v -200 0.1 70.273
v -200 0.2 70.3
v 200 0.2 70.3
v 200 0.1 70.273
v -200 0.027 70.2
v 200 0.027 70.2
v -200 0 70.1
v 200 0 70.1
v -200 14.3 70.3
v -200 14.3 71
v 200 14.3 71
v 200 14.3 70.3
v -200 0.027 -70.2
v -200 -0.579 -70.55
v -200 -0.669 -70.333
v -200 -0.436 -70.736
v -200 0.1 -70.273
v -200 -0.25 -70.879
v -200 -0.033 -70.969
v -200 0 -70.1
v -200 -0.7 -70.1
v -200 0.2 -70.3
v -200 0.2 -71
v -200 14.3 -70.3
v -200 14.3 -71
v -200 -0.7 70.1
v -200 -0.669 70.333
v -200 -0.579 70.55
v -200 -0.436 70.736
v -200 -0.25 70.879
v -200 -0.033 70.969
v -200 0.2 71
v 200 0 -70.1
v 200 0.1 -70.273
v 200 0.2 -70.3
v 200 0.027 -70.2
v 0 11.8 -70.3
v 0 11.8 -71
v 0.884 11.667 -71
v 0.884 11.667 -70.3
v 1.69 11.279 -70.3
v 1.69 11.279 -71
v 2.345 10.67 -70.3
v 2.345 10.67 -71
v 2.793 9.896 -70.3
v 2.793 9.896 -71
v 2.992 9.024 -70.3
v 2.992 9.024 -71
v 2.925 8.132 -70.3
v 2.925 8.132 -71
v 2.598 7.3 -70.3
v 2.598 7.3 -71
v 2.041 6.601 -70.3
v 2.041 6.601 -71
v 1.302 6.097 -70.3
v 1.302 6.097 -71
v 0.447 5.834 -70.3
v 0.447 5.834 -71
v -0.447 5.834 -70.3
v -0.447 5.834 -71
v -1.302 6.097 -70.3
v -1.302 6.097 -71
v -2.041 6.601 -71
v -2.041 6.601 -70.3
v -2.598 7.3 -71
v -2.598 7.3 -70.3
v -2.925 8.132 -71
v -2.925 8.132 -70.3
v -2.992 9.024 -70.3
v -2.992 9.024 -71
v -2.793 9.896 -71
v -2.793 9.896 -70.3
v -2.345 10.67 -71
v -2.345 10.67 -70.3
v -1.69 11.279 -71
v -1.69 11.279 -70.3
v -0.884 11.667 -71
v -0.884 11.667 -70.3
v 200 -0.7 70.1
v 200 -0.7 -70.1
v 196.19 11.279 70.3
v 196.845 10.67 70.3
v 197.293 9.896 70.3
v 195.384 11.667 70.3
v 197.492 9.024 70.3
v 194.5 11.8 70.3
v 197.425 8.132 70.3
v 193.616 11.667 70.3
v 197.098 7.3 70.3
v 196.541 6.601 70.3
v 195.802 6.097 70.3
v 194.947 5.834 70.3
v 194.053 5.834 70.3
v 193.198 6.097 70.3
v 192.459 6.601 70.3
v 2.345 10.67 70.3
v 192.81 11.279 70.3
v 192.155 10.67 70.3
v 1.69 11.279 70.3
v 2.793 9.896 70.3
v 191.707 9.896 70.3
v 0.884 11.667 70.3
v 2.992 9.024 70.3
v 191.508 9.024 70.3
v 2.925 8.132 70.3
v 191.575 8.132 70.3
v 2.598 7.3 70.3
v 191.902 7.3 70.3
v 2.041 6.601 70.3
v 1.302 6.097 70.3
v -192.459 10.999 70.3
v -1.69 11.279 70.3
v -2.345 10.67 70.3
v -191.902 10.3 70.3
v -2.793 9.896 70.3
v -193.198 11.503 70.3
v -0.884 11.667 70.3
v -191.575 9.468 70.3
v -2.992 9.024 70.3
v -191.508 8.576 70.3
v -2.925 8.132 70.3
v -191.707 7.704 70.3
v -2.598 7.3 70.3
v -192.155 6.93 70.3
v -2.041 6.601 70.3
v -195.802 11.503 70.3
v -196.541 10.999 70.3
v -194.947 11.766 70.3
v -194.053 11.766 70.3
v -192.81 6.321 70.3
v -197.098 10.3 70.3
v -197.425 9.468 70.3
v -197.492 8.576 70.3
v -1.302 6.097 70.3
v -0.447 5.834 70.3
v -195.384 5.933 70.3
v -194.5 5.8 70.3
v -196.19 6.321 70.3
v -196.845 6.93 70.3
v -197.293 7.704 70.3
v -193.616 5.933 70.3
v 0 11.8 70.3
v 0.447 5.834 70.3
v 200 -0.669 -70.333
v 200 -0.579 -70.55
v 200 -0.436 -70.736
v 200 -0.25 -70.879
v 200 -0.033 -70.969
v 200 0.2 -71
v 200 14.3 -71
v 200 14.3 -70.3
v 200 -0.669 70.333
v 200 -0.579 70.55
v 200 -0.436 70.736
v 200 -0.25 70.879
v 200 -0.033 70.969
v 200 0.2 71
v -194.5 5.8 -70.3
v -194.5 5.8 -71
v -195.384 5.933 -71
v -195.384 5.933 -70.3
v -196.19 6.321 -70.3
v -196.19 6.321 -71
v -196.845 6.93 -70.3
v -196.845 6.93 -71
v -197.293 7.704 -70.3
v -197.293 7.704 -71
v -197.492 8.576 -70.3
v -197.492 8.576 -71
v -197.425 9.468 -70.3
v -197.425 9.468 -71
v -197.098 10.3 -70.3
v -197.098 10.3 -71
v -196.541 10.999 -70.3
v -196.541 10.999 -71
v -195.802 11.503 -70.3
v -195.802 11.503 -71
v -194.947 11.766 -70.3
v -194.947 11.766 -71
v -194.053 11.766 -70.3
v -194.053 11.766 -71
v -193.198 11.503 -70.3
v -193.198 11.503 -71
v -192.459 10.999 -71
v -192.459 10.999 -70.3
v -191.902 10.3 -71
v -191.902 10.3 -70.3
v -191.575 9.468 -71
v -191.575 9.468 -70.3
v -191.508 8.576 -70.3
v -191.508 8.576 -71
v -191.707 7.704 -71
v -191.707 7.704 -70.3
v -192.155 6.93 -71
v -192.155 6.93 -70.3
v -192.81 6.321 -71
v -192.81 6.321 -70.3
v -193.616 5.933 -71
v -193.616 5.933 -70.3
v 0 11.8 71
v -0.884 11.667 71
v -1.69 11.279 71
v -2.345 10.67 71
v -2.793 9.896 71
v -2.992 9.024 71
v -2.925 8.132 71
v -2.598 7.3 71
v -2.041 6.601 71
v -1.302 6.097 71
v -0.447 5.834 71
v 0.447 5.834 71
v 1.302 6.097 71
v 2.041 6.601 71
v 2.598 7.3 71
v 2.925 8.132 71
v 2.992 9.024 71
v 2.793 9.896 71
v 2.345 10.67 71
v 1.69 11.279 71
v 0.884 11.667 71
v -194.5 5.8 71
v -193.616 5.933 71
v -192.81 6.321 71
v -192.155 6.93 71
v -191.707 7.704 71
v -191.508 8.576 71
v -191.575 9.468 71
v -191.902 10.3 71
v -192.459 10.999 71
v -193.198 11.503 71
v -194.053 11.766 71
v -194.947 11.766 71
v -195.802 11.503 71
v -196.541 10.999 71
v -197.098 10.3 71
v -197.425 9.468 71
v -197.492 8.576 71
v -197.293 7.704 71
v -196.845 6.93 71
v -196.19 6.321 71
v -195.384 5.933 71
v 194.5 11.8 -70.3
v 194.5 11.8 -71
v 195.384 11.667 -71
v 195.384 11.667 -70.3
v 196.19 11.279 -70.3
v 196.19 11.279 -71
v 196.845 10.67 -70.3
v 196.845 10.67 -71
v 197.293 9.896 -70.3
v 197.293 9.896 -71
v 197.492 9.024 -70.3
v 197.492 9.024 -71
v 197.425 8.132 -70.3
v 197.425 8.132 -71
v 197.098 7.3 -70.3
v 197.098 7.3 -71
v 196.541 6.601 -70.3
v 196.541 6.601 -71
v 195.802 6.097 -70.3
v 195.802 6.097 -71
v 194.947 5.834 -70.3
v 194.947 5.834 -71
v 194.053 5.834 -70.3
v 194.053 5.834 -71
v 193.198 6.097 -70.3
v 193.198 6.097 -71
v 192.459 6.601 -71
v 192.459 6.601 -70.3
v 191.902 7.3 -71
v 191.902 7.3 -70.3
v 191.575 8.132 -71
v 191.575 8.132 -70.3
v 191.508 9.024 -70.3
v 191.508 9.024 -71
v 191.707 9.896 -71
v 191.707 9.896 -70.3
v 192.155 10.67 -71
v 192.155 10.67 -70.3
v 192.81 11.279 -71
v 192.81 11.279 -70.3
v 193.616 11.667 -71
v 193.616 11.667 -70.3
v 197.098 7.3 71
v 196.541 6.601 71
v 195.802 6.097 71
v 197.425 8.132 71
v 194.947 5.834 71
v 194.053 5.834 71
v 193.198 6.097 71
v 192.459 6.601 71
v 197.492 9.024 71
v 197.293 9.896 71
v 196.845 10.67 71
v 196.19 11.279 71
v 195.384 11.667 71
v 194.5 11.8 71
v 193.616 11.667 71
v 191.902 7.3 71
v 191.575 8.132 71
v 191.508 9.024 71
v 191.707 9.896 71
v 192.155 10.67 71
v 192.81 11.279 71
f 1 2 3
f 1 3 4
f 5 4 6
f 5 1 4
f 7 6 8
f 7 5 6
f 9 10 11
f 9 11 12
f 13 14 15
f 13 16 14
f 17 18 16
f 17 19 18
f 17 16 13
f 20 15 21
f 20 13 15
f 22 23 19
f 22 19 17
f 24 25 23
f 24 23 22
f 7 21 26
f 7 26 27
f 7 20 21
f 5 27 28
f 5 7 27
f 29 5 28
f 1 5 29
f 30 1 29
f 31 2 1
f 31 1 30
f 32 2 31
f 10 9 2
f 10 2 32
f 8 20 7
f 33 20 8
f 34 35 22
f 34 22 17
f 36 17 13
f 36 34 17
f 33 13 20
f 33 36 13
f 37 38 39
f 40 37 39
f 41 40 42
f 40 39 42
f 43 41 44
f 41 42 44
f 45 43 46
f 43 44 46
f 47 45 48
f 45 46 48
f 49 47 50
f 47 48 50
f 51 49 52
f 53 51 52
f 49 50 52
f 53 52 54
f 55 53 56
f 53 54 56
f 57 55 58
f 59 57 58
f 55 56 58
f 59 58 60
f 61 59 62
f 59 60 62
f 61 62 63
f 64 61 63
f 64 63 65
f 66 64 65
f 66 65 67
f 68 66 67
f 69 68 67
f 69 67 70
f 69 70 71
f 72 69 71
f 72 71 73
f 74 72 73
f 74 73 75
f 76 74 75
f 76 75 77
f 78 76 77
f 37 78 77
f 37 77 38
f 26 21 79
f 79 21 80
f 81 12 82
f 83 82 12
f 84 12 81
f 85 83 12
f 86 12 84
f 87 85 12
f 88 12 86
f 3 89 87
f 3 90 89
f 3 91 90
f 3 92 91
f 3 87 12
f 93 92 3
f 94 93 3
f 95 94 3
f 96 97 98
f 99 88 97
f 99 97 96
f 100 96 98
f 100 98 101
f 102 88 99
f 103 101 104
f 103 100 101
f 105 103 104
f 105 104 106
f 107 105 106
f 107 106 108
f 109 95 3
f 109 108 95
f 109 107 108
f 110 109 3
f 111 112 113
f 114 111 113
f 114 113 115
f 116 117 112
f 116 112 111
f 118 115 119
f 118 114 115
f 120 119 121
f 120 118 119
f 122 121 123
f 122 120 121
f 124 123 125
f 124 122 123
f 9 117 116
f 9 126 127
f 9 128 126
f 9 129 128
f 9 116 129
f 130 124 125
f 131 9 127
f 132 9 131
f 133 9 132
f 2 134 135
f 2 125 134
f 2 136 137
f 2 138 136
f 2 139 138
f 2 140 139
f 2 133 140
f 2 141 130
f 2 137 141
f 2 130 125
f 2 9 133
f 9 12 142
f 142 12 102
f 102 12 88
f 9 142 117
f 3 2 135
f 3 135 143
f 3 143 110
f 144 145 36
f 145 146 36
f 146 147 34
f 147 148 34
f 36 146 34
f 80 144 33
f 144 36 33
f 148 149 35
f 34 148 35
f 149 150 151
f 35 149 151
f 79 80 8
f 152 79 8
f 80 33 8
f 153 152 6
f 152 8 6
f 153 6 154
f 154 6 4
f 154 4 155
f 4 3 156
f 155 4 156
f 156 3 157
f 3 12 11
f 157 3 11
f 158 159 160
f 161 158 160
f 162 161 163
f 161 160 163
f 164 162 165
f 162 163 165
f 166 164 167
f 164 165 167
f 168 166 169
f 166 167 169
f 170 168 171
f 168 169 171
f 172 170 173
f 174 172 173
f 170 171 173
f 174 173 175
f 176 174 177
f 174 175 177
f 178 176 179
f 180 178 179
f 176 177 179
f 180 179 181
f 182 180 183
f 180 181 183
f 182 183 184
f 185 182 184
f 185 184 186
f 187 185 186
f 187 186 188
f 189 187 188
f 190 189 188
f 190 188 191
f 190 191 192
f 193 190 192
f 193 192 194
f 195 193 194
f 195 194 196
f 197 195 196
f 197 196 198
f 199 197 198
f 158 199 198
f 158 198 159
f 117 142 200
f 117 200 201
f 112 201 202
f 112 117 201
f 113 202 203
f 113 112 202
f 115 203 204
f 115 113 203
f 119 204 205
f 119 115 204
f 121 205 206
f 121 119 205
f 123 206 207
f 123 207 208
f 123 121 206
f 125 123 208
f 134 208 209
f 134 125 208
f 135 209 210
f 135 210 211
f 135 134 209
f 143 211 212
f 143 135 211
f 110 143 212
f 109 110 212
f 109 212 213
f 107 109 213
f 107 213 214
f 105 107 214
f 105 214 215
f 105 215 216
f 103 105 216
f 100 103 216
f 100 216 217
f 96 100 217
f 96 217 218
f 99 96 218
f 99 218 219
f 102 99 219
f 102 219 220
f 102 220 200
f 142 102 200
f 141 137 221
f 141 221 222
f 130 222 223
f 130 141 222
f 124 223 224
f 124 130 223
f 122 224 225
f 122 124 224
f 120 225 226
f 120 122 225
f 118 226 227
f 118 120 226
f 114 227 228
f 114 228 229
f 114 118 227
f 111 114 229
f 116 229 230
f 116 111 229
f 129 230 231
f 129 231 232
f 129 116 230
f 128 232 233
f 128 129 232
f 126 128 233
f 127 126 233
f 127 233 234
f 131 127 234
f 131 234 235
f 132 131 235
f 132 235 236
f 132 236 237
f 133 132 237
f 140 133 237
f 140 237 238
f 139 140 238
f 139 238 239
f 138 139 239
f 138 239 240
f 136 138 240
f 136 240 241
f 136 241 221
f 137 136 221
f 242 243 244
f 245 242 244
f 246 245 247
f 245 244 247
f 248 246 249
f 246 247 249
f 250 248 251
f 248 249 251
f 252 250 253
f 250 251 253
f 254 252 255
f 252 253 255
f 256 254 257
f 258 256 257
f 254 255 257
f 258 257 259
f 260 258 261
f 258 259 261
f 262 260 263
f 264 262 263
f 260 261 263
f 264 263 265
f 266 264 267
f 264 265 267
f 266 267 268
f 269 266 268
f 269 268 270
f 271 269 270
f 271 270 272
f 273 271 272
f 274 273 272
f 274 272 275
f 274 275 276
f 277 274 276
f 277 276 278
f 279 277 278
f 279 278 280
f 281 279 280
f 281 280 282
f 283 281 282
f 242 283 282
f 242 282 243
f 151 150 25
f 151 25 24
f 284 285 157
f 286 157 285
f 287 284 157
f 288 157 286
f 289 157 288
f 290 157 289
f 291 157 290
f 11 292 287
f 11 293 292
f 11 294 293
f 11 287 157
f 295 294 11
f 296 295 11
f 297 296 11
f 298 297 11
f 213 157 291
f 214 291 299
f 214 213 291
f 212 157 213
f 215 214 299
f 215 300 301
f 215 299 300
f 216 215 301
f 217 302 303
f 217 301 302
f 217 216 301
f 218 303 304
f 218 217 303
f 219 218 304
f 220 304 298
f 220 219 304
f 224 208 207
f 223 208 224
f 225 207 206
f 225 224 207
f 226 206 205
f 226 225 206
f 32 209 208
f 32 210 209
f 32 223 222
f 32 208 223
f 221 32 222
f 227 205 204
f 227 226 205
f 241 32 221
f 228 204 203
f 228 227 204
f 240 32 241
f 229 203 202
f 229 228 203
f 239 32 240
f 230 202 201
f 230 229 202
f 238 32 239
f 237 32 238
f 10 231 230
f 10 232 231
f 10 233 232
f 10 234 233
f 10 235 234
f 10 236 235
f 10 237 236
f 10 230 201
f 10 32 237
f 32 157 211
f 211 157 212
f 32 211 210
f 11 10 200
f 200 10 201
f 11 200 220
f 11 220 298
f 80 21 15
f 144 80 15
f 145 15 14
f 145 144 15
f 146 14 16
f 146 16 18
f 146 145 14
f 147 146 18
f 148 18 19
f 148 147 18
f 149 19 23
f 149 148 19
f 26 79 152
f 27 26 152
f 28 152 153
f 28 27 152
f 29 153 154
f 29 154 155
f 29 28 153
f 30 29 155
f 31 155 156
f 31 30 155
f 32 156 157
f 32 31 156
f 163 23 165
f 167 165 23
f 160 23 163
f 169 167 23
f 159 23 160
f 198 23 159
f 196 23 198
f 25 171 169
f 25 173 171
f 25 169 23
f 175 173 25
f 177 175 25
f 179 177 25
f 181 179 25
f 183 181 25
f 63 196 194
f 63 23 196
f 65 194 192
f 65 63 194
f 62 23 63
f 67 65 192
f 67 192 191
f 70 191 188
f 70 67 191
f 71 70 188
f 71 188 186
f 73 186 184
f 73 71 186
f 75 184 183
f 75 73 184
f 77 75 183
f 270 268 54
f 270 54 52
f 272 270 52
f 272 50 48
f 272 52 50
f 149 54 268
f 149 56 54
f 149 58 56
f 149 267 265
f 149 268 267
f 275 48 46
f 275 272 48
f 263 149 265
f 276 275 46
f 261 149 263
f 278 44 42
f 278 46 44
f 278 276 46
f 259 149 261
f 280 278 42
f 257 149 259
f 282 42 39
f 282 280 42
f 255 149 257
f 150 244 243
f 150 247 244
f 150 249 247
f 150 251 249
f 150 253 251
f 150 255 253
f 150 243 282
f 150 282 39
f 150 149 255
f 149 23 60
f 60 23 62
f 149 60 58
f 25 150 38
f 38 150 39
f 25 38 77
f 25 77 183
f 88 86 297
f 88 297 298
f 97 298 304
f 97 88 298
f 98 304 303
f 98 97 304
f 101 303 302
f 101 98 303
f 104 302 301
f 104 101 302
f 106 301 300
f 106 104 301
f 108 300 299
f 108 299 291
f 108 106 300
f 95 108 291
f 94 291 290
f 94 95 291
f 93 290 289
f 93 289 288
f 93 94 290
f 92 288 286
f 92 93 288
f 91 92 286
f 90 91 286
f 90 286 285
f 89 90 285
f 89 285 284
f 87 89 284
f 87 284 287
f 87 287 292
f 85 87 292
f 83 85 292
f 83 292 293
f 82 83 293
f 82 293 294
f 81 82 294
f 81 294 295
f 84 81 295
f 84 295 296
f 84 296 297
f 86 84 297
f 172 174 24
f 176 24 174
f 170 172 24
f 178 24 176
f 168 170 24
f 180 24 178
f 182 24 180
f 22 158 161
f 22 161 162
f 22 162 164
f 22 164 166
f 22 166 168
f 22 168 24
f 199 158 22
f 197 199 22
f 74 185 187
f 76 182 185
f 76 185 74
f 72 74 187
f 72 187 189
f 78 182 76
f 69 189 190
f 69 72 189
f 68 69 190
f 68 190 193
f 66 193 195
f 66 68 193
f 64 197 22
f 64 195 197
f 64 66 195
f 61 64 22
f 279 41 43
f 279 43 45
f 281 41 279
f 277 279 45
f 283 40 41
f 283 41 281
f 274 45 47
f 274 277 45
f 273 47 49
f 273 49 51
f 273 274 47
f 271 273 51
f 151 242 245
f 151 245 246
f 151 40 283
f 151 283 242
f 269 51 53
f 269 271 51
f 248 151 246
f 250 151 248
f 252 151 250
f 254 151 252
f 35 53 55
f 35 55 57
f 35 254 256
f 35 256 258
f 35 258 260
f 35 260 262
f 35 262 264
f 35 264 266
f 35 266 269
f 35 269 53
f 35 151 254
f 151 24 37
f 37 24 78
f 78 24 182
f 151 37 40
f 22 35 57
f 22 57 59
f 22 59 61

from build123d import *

# Parameters (mm, degrees)
SKETCH_1_W                         = 400
SKETCH_1_H                         = 142
SM_BASE_FLANGE_1_DEPTH             = 0.7
SM_EDGE_FLANGE_1_STRIP_W           = 3.2
SM_EDGE_FLANGE_1_STRIP_H           = 0.7
SM_EDGE_FLANGE_1_STRIP_CUT_DEPTH   = 400
SM_EDGE_FLANGE_1_STRIP_2_W         = 3.2
SM_EDGE_FLANGE_1_STRIP_2_H         = 0.7
SM_EDGE_FLANGE_1_STRIP_CUT_2_DEPTH = 400
SM_EDGE_FLANGE_1_DEPTH             = 400
SM_EDGE_FLANGE_1_BEND_DEPTH        = 400
SKETCH_17_R                        = 3
CUT_EXTRUDE_1_DEPTH                = 10
CUT_EXTRUDE_START                  = -10
SKETCH_18_R                        = 3
CUT_EXTRUDE_2_DEPTH                = 10


# Sheet-metal steps are written as plain solids
with BuildPart() as part:
    # 草图1 → 基体-法兰1 (new body)
    with BuildSketch(Plane(origin=(0, 0, 0), x_dir=(1, 0, 0), z_dir=(0, 1, 0))):
        Rectangle(SKETCH_1_W, SKETCH_1_H)
    extrude(amount=-SM_BASE_FLANGE_1_DEPTH)

    # 边线-法兰1 strip (across the edge) → 边线-法兰1 strip cut (cut)
    with BuildSketch(Plane(origin=(200, 0, -71), x_dir=(0, 0, 1), z_dir=(-1, 0, 0))):
        with Locations((-0.7, -0.35)):
            Rectangle(SM_EDGE_FLANGE_1_STRIP_W, SM_EDGE_FLANGE_1_STRIP_H)
    extrude(amount=SM_EDGE_FLANGE_1_STRIP_CUT_DEPTH, mode=Mode.SUBTRACT)

    # 边线-法兰1 strip 2 (across the edge) → 边线-法兰1 strip cut 2 (cut)
    with BuildSketch(Plane(origin=(-200, 0, 71), x_dir=(0, 0, -1), z_dir=(1, 0, 0))):
        with Locations((-0.7, -0.35)):
            Rectangle(SM_EDGE_FLANGE_1_STRIP_2_W, SM_EDGE_FLANGE_1_STRIP_2_H)
    extrude(amount=SM_EDGE_FLANGE_1_STRIP_CUT_2_DEPTH, mode=Mode.SUBTRACT)

    # 边线-法兰1 section (across the edge) → 边线-法兰1 (add)
    with BuildSketch(Plane(origin=(200, 0, -71), x_dir=(0, 0, 1), z_dir=(-1, 0, 0))):
        with BuildLine():
            Line((0, 0.2), (0, 14.3))
            Line((0, 14.3), (0.7, 14.3))
            Line((0.7, 14.3), (0.7, 0.2))
            ThreePointArc((0.7, 0.2), (0.758578644, 0.058578644), (0.9, 0))
            Line((0.9, 0), (0.9, -0.7))
            ThreePointArc((0.9, -0.7), (0.263603897, -0.436396103), (0, 0.2))
        make_face()
    extrude(amount=SM_EDGE_FLANGE_1_DEPTH)

    # 边线-法兰1 section 2 (across the edge) → 边线-法兰1 bend (add)
    with BuildSketch(Plane(origin=(-200, 0, 71), x_dir=(0, 0, -1), z_dir=(1, 0, 0))):
        with BuildLine():
            Line((0, 0.2), (0, 14.3))
            Line((0, 14.3), (0.7, 14.3))
            Line((0.7, 14.3), (0.7, 0.2))
            ThreePointArc((0.7, 0.2), (0.758578644, 0.058578644), (0.9, 0))
            Line((0.9, 0), (0.9, -0.7))
            ThreePointArc((0.9, -0.7), (0.263603897, -0.436396103), (0, 0.2))
        make_face()
    extrude(amount=SM_EDGE_FLANGE_1_BEND_DEPTH)

    # 草图17 → 切除-拉伸1 (cut)
    with BuildSketch(Plane(origin=(0, 0, -71), x_dir=(-1, 0, 0), z_dir=(0, 0, -1))):
        with Locations(Location((-194.5, 8.8, 0), (0, 0, 90))):
            Circle(SKETCH_17_R)
        with Locations(Location((0, 8.8, 0), (0, 0, 90))):
            Circle(SKETCH_17_R)
        with Locations(Location((194.5, 8.8, 0), (0, 0, 270))):
            Circle(SKETCH_17_R)
    extrude(amount=-CUT_EXTRUDE_1_DEPTH, mode=Mode.SUBTRACT)

    # 草图18 → 切除-拉伸2 (cut)
    with BuildSketch(Plane.XY.offset(71).offset(CUT_EXTRUDE_START)):
        with Locations(Location((-194.5, 8.8, 0), (0, 0, 270))):
            Circle(SKETCH_18_R)
        with Locations(Location((0, 8.8, 0), (0, 0, 90))):
            Circle(SKETCH_18_R)
        with Locations(Location((194.5, 8.8, 0), (0, 0, 90))):
            Circle(SKETCH_18_R)
    extrude(amount=CUT_EXTRUDE_2_DEPTH, mode=Mode.SUBTRACT)


solid = part.part
